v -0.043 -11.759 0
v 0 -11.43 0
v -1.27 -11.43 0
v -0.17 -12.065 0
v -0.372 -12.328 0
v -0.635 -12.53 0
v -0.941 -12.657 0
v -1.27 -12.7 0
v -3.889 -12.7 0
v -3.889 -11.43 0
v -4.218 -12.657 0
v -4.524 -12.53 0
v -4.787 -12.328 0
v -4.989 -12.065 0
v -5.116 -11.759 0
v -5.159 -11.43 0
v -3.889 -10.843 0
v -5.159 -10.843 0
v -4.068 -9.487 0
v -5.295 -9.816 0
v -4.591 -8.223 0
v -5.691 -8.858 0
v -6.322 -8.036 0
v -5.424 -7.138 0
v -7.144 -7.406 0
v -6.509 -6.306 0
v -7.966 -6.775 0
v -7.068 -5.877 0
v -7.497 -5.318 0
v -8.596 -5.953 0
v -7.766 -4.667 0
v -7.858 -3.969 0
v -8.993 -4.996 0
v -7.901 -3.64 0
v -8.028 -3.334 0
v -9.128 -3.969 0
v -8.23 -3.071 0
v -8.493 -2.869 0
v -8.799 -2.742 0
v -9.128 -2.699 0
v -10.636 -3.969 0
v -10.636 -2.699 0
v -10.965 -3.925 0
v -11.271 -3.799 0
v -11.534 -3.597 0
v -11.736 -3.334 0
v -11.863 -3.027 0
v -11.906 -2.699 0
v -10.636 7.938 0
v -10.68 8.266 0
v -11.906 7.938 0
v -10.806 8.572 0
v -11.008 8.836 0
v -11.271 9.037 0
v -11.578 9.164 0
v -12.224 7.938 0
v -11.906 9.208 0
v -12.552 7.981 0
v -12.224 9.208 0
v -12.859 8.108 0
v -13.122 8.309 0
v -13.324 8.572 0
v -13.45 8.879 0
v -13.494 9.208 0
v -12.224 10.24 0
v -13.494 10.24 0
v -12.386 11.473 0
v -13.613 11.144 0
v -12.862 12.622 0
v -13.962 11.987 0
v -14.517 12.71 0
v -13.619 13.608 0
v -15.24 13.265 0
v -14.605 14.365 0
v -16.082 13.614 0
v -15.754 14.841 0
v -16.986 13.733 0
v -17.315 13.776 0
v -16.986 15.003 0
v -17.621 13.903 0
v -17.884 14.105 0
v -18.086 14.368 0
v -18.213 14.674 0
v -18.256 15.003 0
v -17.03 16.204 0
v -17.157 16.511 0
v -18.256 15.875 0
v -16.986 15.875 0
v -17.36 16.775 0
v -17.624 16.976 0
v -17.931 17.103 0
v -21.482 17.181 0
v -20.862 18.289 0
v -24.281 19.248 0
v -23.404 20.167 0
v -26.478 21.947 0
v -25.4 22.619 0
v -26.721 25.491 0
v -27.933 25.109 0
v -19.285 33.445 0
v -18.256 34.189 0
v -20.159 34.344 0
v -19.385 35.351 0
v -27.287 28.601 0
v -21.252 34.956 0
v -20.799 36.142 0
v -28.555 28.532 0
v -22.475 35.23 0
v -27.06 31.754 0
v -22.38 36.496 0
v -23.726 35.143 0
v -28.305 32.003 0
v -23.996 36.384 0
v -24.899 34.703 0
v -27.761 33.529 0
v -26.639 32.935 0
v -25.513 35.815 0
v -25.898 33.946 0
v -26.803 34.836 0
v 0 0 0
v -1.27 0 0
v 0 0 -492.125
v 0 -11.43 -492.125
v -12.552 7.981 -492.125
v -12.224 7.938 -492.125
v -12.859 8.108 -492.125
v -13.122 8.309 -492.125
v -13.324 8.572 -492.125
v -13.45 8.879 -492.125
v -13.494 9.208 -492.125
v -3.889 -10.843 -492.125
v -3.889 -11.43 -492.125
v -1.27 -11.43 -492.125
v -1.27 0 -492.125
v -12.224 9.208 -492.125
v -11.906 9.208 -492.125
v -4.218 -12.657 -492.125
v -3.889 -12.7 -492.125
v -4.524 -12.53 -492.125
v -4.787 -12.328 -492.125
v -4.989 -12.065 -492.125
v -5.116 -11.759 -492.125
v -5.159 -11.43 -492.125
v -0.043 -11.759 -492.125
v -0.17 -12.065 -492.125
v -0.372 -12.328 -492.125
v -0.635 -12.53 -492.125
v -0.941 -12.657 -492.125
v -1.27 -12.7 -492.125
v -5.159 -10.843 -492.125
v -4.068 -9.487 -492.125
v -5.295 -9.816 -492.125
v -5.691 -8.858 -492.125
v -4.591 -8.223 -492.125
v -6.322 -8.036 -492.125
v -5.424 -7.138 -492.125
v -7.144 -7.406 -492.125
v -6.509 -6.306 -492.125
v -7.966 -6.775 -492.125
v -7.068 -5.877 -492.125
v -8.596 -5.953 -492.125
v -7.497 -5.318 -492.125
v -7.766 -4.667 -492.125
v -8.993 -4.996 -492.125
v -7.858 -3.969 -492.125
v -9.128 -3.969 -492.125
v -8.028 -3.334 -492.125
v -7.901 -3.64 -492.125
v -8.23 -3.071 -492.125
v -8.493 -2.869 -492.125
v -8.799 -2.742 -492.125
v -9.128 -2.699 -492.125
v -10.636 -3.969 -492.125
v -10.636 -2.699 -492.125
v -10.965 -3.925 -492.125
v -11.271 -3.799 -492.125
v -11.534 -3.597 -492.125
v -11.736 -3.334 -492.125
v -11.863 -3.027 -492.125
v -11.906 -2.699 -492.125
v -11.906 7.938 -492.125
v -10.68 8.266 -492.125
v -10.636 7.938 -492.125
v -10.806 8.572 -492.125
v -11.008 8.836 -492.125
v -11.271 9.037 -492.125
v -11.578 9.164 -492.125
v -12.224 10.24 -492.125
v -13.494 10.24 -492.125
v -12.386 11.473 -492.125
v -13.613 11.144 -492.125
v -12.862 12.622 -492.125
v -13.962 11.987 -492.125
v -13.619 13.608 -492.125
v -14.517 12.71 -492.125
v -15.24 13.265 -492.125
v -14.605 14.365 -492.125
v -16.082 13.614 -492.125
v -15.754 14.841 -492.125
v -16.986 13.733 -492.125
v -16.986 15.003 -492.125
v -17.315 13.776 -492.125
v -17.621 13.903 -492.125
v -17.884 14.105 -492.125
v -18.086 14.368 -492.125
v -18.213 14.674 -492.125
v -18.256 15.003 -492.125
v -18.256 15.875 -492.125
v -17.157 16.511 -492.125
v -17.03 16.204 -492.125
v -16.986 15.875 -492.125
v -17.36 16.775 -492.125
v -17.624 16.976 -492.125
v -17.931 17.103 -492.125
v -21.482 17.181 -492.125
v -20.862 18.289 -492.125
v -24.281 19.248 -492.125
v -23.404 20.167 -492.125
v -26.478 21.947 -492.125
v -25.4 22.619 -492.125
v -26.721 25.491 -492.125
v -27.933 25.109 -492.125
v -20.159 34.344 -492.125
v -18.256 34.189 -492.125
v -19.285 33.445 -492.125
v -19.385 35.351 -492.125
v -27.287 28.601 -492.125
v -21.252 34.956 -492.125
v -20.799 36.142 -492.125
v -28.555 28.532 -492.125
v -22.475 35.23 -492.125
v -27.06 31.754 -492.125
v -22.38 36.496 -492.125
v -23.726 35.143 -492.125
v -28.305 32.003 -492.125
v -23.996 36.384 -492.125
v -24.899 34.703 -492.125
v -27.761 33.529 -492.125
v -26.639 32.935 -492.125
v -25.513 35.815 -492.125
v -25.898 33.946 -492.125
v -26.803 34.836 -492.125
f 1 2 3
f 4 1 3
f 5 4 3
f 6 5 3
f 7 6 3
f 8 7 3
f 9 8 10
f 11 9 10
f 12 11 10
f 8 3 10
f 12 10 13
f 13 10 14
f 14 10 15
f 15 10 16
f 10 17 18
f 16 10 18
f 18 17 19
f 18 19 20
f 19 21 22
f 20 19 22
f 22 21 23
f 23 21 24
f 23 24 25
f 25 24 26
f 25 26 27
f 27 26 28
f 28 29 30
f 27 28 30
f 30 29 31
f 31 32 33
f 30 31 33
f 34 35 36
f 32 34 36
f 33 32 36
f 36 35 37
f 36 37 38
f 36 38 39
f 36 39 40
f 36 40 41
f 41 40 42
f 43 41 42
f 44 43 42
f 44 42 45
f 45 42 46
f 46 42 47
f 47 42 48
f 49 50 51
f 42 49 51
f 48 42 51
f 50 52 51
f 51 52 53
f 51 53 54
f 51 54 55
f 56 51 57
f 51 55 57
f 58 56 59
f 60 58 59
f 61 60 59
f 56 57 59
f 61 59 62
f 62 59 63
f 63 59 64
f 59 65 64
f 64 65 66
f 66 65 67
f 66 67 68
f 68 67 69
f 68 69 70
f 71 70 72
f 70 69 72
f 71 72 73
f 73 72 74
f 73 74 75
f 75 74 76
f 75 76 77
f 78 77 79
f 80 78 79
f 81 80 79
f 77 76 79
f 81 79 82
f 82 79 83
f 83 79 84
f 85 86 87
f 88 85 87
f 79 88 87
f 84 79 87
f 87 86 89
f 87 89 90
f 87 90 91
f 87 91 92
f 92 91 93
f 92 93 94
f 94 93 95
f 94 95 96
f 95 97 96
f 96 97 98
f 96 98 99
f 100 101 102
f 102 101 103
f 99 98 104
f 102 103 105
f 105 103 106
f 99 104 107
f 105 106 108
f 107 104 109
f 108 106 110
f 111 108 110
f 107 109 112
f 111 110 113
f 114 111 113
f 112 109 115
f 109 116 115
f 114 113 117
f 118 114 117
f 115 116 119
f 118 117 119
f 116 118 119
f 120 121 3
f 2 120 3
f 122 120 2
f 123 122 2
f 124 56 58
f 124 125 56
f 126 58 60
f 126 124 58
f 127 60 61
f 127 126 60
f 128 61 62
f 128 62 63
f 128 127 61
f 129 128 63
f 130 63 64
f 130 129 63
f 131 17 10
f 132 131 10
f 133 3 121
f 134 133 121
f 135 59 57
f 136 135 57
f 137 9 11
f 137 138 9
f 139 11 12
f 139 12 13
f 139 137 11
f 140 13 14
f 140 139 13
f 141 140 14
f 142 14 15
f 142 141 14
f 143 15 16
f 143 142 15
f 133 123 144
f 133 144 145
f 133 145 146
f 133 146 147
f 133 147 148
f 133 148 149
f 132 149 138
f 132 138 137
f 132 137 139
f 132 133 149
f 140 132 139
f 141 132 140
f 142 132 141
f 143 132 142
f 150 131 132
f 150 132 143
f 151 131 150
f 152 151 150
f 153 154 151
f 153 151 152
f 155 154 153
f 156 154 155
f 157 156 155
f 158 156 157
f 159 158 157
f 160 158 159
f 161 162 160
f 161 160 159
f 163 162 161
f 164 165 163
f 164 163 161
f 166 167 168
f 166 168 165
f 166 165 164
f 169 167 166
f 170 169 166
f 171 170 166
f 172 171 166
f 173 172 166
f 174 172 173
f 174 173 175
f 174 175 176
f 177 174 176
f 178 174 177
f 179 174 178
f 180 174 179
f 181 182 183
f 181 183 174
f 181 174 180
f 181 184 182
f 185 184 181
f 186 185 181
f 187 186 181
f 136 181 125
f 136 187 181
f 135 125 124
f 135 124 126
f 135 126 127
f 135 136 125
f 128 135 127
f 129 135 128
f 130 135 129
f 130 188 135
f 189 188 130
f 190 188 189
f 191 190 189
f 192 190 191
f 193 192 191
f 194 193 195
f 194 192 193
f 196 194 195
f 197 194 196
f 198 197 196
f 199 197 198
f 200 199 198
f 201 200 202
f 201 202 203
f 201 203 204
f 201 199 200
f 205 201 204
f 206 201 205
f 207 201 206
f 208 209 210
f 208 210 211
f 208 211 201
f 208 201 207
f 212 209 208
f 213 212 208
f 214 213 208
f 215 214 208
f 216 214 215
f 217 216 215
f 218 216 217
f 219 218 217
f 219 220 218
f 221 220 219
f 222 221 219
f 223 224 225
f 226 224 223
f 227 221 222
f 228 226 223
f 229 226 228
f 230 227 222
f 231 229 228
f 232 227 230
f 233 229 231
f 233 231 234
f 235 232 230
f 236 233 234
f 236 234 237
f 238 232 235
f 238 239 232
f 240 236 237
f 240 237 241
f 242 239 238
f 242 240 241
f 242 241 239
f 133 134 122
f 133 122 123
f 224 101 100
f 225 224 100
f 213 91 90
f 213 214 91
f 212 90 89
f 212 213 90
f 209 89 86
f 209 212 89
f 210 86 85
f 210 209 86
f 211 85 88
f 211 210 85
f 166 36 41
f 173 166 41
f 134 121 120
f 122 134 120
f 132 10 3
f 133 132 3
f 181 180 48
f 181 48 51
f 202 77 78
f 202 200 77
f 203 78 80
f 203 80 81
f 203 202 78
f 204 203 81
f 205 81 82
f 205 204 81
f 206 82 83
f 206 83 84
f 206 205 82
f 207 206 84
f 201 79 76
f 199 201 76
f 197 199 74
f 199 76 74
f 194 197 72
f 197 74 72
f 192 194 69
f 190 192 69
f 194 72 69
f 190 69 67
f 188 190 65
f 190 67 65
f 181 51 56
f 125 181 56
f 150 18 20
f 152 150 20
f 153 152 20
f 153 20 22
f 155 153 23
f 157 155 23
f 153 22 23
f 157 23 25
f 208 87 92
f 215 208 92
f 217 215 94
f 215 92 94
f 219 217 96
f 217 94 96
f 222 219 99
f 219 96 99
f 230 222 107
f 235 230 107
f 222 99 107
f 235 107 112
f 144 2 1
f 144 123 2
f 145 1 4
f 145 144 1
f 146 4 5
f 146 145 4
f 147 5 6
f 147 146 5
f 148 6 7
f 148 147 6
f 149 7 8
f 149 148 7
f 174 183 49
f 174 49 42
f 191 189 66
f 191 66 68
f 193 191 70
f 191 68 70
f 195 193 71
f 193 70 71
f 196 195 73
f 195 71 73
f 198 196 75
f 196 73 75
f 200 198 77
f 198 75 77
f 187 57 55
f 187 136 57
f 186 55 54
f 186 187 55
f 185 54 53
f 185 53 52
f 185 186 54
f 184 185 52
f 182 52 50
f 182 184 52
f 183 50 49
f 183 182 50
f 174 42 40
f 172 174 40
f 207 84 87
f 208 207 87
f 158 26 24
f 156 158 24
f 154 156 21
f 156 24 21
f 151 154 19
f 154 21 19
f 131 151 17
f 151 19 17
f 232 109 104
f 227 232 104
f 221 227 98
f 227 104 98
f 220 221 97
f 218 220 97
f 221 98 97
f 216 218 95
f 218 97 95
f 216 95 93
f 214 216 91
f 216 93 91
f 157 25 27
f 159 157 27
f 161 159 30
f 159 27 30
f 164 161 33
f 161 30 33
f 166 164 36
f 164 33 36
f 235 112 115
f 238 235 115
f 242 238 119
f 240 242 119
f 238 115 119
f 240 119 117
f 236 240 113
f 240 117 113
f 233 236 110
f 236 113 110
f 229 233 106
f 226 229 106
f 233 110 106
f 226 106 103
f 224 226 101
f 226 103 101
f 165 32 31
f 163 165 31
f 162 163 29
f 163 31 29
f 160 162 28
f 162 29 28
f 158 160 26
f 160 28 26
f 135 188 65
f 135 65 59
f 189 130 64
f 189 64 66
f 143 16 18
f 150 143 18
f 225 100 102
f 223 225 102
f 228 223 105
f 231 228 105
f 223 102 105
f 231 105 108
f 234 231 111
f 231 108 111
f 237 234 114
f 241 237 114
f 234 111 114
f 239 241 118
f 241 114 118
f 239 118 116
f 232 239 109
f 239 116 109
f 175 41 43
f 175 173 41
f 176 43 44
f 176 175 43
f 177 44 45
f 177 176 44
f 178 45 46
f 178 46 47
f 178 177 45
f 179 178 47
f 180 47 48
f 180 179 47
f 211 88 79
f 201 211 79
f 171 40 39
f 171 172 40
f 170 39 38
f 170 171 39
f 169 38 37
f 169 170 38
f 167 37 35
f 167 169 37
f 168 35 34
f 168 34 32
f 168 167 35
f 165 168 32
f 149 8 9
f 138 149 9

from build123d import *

# Parameters (mm, degrees)
EXTRUDE_THIN1_DEPTH = 492.125
FILLET1_R           = 1.27


with BuildPart() as part:
    # Sketch1 → Extrude-Thin1 (new body)
    with BuildSketch(Plane.XY):
        with BuildLine():
            Line((0, 0), (0, -12.7))
            Line((0, -12.7), (-5.159375, -12.7))
            Line((-5.159375, -12.7), (-5.159375, -10.842826643))
            ThreePointArc((-5.159375, -10.842826643), (-5.691086679, -8.858451643), (-7.14375, -7.405788321))
            ThreePointArc((-7.14375, -7.405788321), (-8.596413321, -5.953125), (-9.128125, -3.96875))
            Line((-9.128125, -3.96875), (-11.90625, -3.96875))
            Line((-11.90625, -3.96875), (-11.90625, 7.9375))
            Line((-11.90625, 7.9375), (-13.49375, 7.9375))
            Line((-13.49375, 7.9375), (-13.49375, 10.240343132))
            ThreePointArc((-13.49375, 10.240343132), (-15.016214309, 13.124180094), (-18.25625, 13.49375))
            Line((-18.25625, 13.49375), (-18.25625, 15.875))
            ThreePointArc((-18.25625, 15.875), (-26.477500212, 21.947406572), (-28.305018694, 32.003412381))
            ThreePointArc((-28.305018694, 32.003412381), (-23.995750741, 36.384342306), (-18.25625, 34.18878576))
            Line((-18.25625, 34.18878576), (-19.28547828, 33.444750043))
            ThreePointArc((-19.28547828, 33.444750043), (-23.725863862, 35.143350335), (-27.059744656, 31.754027996))
            ThreePointArc((-27.059744656, 31.754027996), (-25.135637157, 22.212936626), (-16.98625, 16.891085148))
            Line((-16.98625, 16.891085148), (-16.98625, 15.002843132))
            ThreePointArc((-16.98625, 15.002843132), (-13.618653955, 13.607939177), (-12.22375, 10.240343132))
            Line((-12.22375, 10.240343132), (-12.22375, 9.2075))
            Line((-12.22375, 9.2075), (-10.63625, 9.2075))
            Line((-10.63625, 9.2075), (-10.63625, -2.69875))
            Line((-10.63625, -2.69875), (-7.540625, -2.69875))
            ThreePointArc((-7.540625, -2.69875), (-7.754050035, -4.710985155), (-6.50875, -6.305936058))
            ThreePointArc((-6.50875, -6.305936058), (-4.591234416, -8.223451643), (-3.889375, -10.842826643))
            Line((-3.889375, -10.842826643), (-3.889375, -11.43))
            Line((-3.889375, -11.43), (-1.27, -11.43))
            Line((-1.27, -11.43), (-1.27, 0))
            Line((-1.27, 0), (0, 0))
        make_face()
    extrude(amount=-EXTRUDE_THIN1_DEPTH)

    # Fillet1
    fillet1_edges = [part.edges().sort_by_distance(p)[0] for p in [
        (-16.98625, 16.891085148, -246.0625),
        (-10.63625, 9.2075, -246.0625),
        (-7.540625, -2.69875, -246.0625),
        (0, -12.7, -246.0625),
        (-5.159375, -12.7, -246.0625),
        (-11.90625, -3.96875, -246.0625),
        (-13.49375, 7.9375, -246.0625),
        (-18.25625, 13.49375, -246.0625),
    ]]
    fillet(fillet1_edges, radius=FILLET1_R)


solid = part.part
